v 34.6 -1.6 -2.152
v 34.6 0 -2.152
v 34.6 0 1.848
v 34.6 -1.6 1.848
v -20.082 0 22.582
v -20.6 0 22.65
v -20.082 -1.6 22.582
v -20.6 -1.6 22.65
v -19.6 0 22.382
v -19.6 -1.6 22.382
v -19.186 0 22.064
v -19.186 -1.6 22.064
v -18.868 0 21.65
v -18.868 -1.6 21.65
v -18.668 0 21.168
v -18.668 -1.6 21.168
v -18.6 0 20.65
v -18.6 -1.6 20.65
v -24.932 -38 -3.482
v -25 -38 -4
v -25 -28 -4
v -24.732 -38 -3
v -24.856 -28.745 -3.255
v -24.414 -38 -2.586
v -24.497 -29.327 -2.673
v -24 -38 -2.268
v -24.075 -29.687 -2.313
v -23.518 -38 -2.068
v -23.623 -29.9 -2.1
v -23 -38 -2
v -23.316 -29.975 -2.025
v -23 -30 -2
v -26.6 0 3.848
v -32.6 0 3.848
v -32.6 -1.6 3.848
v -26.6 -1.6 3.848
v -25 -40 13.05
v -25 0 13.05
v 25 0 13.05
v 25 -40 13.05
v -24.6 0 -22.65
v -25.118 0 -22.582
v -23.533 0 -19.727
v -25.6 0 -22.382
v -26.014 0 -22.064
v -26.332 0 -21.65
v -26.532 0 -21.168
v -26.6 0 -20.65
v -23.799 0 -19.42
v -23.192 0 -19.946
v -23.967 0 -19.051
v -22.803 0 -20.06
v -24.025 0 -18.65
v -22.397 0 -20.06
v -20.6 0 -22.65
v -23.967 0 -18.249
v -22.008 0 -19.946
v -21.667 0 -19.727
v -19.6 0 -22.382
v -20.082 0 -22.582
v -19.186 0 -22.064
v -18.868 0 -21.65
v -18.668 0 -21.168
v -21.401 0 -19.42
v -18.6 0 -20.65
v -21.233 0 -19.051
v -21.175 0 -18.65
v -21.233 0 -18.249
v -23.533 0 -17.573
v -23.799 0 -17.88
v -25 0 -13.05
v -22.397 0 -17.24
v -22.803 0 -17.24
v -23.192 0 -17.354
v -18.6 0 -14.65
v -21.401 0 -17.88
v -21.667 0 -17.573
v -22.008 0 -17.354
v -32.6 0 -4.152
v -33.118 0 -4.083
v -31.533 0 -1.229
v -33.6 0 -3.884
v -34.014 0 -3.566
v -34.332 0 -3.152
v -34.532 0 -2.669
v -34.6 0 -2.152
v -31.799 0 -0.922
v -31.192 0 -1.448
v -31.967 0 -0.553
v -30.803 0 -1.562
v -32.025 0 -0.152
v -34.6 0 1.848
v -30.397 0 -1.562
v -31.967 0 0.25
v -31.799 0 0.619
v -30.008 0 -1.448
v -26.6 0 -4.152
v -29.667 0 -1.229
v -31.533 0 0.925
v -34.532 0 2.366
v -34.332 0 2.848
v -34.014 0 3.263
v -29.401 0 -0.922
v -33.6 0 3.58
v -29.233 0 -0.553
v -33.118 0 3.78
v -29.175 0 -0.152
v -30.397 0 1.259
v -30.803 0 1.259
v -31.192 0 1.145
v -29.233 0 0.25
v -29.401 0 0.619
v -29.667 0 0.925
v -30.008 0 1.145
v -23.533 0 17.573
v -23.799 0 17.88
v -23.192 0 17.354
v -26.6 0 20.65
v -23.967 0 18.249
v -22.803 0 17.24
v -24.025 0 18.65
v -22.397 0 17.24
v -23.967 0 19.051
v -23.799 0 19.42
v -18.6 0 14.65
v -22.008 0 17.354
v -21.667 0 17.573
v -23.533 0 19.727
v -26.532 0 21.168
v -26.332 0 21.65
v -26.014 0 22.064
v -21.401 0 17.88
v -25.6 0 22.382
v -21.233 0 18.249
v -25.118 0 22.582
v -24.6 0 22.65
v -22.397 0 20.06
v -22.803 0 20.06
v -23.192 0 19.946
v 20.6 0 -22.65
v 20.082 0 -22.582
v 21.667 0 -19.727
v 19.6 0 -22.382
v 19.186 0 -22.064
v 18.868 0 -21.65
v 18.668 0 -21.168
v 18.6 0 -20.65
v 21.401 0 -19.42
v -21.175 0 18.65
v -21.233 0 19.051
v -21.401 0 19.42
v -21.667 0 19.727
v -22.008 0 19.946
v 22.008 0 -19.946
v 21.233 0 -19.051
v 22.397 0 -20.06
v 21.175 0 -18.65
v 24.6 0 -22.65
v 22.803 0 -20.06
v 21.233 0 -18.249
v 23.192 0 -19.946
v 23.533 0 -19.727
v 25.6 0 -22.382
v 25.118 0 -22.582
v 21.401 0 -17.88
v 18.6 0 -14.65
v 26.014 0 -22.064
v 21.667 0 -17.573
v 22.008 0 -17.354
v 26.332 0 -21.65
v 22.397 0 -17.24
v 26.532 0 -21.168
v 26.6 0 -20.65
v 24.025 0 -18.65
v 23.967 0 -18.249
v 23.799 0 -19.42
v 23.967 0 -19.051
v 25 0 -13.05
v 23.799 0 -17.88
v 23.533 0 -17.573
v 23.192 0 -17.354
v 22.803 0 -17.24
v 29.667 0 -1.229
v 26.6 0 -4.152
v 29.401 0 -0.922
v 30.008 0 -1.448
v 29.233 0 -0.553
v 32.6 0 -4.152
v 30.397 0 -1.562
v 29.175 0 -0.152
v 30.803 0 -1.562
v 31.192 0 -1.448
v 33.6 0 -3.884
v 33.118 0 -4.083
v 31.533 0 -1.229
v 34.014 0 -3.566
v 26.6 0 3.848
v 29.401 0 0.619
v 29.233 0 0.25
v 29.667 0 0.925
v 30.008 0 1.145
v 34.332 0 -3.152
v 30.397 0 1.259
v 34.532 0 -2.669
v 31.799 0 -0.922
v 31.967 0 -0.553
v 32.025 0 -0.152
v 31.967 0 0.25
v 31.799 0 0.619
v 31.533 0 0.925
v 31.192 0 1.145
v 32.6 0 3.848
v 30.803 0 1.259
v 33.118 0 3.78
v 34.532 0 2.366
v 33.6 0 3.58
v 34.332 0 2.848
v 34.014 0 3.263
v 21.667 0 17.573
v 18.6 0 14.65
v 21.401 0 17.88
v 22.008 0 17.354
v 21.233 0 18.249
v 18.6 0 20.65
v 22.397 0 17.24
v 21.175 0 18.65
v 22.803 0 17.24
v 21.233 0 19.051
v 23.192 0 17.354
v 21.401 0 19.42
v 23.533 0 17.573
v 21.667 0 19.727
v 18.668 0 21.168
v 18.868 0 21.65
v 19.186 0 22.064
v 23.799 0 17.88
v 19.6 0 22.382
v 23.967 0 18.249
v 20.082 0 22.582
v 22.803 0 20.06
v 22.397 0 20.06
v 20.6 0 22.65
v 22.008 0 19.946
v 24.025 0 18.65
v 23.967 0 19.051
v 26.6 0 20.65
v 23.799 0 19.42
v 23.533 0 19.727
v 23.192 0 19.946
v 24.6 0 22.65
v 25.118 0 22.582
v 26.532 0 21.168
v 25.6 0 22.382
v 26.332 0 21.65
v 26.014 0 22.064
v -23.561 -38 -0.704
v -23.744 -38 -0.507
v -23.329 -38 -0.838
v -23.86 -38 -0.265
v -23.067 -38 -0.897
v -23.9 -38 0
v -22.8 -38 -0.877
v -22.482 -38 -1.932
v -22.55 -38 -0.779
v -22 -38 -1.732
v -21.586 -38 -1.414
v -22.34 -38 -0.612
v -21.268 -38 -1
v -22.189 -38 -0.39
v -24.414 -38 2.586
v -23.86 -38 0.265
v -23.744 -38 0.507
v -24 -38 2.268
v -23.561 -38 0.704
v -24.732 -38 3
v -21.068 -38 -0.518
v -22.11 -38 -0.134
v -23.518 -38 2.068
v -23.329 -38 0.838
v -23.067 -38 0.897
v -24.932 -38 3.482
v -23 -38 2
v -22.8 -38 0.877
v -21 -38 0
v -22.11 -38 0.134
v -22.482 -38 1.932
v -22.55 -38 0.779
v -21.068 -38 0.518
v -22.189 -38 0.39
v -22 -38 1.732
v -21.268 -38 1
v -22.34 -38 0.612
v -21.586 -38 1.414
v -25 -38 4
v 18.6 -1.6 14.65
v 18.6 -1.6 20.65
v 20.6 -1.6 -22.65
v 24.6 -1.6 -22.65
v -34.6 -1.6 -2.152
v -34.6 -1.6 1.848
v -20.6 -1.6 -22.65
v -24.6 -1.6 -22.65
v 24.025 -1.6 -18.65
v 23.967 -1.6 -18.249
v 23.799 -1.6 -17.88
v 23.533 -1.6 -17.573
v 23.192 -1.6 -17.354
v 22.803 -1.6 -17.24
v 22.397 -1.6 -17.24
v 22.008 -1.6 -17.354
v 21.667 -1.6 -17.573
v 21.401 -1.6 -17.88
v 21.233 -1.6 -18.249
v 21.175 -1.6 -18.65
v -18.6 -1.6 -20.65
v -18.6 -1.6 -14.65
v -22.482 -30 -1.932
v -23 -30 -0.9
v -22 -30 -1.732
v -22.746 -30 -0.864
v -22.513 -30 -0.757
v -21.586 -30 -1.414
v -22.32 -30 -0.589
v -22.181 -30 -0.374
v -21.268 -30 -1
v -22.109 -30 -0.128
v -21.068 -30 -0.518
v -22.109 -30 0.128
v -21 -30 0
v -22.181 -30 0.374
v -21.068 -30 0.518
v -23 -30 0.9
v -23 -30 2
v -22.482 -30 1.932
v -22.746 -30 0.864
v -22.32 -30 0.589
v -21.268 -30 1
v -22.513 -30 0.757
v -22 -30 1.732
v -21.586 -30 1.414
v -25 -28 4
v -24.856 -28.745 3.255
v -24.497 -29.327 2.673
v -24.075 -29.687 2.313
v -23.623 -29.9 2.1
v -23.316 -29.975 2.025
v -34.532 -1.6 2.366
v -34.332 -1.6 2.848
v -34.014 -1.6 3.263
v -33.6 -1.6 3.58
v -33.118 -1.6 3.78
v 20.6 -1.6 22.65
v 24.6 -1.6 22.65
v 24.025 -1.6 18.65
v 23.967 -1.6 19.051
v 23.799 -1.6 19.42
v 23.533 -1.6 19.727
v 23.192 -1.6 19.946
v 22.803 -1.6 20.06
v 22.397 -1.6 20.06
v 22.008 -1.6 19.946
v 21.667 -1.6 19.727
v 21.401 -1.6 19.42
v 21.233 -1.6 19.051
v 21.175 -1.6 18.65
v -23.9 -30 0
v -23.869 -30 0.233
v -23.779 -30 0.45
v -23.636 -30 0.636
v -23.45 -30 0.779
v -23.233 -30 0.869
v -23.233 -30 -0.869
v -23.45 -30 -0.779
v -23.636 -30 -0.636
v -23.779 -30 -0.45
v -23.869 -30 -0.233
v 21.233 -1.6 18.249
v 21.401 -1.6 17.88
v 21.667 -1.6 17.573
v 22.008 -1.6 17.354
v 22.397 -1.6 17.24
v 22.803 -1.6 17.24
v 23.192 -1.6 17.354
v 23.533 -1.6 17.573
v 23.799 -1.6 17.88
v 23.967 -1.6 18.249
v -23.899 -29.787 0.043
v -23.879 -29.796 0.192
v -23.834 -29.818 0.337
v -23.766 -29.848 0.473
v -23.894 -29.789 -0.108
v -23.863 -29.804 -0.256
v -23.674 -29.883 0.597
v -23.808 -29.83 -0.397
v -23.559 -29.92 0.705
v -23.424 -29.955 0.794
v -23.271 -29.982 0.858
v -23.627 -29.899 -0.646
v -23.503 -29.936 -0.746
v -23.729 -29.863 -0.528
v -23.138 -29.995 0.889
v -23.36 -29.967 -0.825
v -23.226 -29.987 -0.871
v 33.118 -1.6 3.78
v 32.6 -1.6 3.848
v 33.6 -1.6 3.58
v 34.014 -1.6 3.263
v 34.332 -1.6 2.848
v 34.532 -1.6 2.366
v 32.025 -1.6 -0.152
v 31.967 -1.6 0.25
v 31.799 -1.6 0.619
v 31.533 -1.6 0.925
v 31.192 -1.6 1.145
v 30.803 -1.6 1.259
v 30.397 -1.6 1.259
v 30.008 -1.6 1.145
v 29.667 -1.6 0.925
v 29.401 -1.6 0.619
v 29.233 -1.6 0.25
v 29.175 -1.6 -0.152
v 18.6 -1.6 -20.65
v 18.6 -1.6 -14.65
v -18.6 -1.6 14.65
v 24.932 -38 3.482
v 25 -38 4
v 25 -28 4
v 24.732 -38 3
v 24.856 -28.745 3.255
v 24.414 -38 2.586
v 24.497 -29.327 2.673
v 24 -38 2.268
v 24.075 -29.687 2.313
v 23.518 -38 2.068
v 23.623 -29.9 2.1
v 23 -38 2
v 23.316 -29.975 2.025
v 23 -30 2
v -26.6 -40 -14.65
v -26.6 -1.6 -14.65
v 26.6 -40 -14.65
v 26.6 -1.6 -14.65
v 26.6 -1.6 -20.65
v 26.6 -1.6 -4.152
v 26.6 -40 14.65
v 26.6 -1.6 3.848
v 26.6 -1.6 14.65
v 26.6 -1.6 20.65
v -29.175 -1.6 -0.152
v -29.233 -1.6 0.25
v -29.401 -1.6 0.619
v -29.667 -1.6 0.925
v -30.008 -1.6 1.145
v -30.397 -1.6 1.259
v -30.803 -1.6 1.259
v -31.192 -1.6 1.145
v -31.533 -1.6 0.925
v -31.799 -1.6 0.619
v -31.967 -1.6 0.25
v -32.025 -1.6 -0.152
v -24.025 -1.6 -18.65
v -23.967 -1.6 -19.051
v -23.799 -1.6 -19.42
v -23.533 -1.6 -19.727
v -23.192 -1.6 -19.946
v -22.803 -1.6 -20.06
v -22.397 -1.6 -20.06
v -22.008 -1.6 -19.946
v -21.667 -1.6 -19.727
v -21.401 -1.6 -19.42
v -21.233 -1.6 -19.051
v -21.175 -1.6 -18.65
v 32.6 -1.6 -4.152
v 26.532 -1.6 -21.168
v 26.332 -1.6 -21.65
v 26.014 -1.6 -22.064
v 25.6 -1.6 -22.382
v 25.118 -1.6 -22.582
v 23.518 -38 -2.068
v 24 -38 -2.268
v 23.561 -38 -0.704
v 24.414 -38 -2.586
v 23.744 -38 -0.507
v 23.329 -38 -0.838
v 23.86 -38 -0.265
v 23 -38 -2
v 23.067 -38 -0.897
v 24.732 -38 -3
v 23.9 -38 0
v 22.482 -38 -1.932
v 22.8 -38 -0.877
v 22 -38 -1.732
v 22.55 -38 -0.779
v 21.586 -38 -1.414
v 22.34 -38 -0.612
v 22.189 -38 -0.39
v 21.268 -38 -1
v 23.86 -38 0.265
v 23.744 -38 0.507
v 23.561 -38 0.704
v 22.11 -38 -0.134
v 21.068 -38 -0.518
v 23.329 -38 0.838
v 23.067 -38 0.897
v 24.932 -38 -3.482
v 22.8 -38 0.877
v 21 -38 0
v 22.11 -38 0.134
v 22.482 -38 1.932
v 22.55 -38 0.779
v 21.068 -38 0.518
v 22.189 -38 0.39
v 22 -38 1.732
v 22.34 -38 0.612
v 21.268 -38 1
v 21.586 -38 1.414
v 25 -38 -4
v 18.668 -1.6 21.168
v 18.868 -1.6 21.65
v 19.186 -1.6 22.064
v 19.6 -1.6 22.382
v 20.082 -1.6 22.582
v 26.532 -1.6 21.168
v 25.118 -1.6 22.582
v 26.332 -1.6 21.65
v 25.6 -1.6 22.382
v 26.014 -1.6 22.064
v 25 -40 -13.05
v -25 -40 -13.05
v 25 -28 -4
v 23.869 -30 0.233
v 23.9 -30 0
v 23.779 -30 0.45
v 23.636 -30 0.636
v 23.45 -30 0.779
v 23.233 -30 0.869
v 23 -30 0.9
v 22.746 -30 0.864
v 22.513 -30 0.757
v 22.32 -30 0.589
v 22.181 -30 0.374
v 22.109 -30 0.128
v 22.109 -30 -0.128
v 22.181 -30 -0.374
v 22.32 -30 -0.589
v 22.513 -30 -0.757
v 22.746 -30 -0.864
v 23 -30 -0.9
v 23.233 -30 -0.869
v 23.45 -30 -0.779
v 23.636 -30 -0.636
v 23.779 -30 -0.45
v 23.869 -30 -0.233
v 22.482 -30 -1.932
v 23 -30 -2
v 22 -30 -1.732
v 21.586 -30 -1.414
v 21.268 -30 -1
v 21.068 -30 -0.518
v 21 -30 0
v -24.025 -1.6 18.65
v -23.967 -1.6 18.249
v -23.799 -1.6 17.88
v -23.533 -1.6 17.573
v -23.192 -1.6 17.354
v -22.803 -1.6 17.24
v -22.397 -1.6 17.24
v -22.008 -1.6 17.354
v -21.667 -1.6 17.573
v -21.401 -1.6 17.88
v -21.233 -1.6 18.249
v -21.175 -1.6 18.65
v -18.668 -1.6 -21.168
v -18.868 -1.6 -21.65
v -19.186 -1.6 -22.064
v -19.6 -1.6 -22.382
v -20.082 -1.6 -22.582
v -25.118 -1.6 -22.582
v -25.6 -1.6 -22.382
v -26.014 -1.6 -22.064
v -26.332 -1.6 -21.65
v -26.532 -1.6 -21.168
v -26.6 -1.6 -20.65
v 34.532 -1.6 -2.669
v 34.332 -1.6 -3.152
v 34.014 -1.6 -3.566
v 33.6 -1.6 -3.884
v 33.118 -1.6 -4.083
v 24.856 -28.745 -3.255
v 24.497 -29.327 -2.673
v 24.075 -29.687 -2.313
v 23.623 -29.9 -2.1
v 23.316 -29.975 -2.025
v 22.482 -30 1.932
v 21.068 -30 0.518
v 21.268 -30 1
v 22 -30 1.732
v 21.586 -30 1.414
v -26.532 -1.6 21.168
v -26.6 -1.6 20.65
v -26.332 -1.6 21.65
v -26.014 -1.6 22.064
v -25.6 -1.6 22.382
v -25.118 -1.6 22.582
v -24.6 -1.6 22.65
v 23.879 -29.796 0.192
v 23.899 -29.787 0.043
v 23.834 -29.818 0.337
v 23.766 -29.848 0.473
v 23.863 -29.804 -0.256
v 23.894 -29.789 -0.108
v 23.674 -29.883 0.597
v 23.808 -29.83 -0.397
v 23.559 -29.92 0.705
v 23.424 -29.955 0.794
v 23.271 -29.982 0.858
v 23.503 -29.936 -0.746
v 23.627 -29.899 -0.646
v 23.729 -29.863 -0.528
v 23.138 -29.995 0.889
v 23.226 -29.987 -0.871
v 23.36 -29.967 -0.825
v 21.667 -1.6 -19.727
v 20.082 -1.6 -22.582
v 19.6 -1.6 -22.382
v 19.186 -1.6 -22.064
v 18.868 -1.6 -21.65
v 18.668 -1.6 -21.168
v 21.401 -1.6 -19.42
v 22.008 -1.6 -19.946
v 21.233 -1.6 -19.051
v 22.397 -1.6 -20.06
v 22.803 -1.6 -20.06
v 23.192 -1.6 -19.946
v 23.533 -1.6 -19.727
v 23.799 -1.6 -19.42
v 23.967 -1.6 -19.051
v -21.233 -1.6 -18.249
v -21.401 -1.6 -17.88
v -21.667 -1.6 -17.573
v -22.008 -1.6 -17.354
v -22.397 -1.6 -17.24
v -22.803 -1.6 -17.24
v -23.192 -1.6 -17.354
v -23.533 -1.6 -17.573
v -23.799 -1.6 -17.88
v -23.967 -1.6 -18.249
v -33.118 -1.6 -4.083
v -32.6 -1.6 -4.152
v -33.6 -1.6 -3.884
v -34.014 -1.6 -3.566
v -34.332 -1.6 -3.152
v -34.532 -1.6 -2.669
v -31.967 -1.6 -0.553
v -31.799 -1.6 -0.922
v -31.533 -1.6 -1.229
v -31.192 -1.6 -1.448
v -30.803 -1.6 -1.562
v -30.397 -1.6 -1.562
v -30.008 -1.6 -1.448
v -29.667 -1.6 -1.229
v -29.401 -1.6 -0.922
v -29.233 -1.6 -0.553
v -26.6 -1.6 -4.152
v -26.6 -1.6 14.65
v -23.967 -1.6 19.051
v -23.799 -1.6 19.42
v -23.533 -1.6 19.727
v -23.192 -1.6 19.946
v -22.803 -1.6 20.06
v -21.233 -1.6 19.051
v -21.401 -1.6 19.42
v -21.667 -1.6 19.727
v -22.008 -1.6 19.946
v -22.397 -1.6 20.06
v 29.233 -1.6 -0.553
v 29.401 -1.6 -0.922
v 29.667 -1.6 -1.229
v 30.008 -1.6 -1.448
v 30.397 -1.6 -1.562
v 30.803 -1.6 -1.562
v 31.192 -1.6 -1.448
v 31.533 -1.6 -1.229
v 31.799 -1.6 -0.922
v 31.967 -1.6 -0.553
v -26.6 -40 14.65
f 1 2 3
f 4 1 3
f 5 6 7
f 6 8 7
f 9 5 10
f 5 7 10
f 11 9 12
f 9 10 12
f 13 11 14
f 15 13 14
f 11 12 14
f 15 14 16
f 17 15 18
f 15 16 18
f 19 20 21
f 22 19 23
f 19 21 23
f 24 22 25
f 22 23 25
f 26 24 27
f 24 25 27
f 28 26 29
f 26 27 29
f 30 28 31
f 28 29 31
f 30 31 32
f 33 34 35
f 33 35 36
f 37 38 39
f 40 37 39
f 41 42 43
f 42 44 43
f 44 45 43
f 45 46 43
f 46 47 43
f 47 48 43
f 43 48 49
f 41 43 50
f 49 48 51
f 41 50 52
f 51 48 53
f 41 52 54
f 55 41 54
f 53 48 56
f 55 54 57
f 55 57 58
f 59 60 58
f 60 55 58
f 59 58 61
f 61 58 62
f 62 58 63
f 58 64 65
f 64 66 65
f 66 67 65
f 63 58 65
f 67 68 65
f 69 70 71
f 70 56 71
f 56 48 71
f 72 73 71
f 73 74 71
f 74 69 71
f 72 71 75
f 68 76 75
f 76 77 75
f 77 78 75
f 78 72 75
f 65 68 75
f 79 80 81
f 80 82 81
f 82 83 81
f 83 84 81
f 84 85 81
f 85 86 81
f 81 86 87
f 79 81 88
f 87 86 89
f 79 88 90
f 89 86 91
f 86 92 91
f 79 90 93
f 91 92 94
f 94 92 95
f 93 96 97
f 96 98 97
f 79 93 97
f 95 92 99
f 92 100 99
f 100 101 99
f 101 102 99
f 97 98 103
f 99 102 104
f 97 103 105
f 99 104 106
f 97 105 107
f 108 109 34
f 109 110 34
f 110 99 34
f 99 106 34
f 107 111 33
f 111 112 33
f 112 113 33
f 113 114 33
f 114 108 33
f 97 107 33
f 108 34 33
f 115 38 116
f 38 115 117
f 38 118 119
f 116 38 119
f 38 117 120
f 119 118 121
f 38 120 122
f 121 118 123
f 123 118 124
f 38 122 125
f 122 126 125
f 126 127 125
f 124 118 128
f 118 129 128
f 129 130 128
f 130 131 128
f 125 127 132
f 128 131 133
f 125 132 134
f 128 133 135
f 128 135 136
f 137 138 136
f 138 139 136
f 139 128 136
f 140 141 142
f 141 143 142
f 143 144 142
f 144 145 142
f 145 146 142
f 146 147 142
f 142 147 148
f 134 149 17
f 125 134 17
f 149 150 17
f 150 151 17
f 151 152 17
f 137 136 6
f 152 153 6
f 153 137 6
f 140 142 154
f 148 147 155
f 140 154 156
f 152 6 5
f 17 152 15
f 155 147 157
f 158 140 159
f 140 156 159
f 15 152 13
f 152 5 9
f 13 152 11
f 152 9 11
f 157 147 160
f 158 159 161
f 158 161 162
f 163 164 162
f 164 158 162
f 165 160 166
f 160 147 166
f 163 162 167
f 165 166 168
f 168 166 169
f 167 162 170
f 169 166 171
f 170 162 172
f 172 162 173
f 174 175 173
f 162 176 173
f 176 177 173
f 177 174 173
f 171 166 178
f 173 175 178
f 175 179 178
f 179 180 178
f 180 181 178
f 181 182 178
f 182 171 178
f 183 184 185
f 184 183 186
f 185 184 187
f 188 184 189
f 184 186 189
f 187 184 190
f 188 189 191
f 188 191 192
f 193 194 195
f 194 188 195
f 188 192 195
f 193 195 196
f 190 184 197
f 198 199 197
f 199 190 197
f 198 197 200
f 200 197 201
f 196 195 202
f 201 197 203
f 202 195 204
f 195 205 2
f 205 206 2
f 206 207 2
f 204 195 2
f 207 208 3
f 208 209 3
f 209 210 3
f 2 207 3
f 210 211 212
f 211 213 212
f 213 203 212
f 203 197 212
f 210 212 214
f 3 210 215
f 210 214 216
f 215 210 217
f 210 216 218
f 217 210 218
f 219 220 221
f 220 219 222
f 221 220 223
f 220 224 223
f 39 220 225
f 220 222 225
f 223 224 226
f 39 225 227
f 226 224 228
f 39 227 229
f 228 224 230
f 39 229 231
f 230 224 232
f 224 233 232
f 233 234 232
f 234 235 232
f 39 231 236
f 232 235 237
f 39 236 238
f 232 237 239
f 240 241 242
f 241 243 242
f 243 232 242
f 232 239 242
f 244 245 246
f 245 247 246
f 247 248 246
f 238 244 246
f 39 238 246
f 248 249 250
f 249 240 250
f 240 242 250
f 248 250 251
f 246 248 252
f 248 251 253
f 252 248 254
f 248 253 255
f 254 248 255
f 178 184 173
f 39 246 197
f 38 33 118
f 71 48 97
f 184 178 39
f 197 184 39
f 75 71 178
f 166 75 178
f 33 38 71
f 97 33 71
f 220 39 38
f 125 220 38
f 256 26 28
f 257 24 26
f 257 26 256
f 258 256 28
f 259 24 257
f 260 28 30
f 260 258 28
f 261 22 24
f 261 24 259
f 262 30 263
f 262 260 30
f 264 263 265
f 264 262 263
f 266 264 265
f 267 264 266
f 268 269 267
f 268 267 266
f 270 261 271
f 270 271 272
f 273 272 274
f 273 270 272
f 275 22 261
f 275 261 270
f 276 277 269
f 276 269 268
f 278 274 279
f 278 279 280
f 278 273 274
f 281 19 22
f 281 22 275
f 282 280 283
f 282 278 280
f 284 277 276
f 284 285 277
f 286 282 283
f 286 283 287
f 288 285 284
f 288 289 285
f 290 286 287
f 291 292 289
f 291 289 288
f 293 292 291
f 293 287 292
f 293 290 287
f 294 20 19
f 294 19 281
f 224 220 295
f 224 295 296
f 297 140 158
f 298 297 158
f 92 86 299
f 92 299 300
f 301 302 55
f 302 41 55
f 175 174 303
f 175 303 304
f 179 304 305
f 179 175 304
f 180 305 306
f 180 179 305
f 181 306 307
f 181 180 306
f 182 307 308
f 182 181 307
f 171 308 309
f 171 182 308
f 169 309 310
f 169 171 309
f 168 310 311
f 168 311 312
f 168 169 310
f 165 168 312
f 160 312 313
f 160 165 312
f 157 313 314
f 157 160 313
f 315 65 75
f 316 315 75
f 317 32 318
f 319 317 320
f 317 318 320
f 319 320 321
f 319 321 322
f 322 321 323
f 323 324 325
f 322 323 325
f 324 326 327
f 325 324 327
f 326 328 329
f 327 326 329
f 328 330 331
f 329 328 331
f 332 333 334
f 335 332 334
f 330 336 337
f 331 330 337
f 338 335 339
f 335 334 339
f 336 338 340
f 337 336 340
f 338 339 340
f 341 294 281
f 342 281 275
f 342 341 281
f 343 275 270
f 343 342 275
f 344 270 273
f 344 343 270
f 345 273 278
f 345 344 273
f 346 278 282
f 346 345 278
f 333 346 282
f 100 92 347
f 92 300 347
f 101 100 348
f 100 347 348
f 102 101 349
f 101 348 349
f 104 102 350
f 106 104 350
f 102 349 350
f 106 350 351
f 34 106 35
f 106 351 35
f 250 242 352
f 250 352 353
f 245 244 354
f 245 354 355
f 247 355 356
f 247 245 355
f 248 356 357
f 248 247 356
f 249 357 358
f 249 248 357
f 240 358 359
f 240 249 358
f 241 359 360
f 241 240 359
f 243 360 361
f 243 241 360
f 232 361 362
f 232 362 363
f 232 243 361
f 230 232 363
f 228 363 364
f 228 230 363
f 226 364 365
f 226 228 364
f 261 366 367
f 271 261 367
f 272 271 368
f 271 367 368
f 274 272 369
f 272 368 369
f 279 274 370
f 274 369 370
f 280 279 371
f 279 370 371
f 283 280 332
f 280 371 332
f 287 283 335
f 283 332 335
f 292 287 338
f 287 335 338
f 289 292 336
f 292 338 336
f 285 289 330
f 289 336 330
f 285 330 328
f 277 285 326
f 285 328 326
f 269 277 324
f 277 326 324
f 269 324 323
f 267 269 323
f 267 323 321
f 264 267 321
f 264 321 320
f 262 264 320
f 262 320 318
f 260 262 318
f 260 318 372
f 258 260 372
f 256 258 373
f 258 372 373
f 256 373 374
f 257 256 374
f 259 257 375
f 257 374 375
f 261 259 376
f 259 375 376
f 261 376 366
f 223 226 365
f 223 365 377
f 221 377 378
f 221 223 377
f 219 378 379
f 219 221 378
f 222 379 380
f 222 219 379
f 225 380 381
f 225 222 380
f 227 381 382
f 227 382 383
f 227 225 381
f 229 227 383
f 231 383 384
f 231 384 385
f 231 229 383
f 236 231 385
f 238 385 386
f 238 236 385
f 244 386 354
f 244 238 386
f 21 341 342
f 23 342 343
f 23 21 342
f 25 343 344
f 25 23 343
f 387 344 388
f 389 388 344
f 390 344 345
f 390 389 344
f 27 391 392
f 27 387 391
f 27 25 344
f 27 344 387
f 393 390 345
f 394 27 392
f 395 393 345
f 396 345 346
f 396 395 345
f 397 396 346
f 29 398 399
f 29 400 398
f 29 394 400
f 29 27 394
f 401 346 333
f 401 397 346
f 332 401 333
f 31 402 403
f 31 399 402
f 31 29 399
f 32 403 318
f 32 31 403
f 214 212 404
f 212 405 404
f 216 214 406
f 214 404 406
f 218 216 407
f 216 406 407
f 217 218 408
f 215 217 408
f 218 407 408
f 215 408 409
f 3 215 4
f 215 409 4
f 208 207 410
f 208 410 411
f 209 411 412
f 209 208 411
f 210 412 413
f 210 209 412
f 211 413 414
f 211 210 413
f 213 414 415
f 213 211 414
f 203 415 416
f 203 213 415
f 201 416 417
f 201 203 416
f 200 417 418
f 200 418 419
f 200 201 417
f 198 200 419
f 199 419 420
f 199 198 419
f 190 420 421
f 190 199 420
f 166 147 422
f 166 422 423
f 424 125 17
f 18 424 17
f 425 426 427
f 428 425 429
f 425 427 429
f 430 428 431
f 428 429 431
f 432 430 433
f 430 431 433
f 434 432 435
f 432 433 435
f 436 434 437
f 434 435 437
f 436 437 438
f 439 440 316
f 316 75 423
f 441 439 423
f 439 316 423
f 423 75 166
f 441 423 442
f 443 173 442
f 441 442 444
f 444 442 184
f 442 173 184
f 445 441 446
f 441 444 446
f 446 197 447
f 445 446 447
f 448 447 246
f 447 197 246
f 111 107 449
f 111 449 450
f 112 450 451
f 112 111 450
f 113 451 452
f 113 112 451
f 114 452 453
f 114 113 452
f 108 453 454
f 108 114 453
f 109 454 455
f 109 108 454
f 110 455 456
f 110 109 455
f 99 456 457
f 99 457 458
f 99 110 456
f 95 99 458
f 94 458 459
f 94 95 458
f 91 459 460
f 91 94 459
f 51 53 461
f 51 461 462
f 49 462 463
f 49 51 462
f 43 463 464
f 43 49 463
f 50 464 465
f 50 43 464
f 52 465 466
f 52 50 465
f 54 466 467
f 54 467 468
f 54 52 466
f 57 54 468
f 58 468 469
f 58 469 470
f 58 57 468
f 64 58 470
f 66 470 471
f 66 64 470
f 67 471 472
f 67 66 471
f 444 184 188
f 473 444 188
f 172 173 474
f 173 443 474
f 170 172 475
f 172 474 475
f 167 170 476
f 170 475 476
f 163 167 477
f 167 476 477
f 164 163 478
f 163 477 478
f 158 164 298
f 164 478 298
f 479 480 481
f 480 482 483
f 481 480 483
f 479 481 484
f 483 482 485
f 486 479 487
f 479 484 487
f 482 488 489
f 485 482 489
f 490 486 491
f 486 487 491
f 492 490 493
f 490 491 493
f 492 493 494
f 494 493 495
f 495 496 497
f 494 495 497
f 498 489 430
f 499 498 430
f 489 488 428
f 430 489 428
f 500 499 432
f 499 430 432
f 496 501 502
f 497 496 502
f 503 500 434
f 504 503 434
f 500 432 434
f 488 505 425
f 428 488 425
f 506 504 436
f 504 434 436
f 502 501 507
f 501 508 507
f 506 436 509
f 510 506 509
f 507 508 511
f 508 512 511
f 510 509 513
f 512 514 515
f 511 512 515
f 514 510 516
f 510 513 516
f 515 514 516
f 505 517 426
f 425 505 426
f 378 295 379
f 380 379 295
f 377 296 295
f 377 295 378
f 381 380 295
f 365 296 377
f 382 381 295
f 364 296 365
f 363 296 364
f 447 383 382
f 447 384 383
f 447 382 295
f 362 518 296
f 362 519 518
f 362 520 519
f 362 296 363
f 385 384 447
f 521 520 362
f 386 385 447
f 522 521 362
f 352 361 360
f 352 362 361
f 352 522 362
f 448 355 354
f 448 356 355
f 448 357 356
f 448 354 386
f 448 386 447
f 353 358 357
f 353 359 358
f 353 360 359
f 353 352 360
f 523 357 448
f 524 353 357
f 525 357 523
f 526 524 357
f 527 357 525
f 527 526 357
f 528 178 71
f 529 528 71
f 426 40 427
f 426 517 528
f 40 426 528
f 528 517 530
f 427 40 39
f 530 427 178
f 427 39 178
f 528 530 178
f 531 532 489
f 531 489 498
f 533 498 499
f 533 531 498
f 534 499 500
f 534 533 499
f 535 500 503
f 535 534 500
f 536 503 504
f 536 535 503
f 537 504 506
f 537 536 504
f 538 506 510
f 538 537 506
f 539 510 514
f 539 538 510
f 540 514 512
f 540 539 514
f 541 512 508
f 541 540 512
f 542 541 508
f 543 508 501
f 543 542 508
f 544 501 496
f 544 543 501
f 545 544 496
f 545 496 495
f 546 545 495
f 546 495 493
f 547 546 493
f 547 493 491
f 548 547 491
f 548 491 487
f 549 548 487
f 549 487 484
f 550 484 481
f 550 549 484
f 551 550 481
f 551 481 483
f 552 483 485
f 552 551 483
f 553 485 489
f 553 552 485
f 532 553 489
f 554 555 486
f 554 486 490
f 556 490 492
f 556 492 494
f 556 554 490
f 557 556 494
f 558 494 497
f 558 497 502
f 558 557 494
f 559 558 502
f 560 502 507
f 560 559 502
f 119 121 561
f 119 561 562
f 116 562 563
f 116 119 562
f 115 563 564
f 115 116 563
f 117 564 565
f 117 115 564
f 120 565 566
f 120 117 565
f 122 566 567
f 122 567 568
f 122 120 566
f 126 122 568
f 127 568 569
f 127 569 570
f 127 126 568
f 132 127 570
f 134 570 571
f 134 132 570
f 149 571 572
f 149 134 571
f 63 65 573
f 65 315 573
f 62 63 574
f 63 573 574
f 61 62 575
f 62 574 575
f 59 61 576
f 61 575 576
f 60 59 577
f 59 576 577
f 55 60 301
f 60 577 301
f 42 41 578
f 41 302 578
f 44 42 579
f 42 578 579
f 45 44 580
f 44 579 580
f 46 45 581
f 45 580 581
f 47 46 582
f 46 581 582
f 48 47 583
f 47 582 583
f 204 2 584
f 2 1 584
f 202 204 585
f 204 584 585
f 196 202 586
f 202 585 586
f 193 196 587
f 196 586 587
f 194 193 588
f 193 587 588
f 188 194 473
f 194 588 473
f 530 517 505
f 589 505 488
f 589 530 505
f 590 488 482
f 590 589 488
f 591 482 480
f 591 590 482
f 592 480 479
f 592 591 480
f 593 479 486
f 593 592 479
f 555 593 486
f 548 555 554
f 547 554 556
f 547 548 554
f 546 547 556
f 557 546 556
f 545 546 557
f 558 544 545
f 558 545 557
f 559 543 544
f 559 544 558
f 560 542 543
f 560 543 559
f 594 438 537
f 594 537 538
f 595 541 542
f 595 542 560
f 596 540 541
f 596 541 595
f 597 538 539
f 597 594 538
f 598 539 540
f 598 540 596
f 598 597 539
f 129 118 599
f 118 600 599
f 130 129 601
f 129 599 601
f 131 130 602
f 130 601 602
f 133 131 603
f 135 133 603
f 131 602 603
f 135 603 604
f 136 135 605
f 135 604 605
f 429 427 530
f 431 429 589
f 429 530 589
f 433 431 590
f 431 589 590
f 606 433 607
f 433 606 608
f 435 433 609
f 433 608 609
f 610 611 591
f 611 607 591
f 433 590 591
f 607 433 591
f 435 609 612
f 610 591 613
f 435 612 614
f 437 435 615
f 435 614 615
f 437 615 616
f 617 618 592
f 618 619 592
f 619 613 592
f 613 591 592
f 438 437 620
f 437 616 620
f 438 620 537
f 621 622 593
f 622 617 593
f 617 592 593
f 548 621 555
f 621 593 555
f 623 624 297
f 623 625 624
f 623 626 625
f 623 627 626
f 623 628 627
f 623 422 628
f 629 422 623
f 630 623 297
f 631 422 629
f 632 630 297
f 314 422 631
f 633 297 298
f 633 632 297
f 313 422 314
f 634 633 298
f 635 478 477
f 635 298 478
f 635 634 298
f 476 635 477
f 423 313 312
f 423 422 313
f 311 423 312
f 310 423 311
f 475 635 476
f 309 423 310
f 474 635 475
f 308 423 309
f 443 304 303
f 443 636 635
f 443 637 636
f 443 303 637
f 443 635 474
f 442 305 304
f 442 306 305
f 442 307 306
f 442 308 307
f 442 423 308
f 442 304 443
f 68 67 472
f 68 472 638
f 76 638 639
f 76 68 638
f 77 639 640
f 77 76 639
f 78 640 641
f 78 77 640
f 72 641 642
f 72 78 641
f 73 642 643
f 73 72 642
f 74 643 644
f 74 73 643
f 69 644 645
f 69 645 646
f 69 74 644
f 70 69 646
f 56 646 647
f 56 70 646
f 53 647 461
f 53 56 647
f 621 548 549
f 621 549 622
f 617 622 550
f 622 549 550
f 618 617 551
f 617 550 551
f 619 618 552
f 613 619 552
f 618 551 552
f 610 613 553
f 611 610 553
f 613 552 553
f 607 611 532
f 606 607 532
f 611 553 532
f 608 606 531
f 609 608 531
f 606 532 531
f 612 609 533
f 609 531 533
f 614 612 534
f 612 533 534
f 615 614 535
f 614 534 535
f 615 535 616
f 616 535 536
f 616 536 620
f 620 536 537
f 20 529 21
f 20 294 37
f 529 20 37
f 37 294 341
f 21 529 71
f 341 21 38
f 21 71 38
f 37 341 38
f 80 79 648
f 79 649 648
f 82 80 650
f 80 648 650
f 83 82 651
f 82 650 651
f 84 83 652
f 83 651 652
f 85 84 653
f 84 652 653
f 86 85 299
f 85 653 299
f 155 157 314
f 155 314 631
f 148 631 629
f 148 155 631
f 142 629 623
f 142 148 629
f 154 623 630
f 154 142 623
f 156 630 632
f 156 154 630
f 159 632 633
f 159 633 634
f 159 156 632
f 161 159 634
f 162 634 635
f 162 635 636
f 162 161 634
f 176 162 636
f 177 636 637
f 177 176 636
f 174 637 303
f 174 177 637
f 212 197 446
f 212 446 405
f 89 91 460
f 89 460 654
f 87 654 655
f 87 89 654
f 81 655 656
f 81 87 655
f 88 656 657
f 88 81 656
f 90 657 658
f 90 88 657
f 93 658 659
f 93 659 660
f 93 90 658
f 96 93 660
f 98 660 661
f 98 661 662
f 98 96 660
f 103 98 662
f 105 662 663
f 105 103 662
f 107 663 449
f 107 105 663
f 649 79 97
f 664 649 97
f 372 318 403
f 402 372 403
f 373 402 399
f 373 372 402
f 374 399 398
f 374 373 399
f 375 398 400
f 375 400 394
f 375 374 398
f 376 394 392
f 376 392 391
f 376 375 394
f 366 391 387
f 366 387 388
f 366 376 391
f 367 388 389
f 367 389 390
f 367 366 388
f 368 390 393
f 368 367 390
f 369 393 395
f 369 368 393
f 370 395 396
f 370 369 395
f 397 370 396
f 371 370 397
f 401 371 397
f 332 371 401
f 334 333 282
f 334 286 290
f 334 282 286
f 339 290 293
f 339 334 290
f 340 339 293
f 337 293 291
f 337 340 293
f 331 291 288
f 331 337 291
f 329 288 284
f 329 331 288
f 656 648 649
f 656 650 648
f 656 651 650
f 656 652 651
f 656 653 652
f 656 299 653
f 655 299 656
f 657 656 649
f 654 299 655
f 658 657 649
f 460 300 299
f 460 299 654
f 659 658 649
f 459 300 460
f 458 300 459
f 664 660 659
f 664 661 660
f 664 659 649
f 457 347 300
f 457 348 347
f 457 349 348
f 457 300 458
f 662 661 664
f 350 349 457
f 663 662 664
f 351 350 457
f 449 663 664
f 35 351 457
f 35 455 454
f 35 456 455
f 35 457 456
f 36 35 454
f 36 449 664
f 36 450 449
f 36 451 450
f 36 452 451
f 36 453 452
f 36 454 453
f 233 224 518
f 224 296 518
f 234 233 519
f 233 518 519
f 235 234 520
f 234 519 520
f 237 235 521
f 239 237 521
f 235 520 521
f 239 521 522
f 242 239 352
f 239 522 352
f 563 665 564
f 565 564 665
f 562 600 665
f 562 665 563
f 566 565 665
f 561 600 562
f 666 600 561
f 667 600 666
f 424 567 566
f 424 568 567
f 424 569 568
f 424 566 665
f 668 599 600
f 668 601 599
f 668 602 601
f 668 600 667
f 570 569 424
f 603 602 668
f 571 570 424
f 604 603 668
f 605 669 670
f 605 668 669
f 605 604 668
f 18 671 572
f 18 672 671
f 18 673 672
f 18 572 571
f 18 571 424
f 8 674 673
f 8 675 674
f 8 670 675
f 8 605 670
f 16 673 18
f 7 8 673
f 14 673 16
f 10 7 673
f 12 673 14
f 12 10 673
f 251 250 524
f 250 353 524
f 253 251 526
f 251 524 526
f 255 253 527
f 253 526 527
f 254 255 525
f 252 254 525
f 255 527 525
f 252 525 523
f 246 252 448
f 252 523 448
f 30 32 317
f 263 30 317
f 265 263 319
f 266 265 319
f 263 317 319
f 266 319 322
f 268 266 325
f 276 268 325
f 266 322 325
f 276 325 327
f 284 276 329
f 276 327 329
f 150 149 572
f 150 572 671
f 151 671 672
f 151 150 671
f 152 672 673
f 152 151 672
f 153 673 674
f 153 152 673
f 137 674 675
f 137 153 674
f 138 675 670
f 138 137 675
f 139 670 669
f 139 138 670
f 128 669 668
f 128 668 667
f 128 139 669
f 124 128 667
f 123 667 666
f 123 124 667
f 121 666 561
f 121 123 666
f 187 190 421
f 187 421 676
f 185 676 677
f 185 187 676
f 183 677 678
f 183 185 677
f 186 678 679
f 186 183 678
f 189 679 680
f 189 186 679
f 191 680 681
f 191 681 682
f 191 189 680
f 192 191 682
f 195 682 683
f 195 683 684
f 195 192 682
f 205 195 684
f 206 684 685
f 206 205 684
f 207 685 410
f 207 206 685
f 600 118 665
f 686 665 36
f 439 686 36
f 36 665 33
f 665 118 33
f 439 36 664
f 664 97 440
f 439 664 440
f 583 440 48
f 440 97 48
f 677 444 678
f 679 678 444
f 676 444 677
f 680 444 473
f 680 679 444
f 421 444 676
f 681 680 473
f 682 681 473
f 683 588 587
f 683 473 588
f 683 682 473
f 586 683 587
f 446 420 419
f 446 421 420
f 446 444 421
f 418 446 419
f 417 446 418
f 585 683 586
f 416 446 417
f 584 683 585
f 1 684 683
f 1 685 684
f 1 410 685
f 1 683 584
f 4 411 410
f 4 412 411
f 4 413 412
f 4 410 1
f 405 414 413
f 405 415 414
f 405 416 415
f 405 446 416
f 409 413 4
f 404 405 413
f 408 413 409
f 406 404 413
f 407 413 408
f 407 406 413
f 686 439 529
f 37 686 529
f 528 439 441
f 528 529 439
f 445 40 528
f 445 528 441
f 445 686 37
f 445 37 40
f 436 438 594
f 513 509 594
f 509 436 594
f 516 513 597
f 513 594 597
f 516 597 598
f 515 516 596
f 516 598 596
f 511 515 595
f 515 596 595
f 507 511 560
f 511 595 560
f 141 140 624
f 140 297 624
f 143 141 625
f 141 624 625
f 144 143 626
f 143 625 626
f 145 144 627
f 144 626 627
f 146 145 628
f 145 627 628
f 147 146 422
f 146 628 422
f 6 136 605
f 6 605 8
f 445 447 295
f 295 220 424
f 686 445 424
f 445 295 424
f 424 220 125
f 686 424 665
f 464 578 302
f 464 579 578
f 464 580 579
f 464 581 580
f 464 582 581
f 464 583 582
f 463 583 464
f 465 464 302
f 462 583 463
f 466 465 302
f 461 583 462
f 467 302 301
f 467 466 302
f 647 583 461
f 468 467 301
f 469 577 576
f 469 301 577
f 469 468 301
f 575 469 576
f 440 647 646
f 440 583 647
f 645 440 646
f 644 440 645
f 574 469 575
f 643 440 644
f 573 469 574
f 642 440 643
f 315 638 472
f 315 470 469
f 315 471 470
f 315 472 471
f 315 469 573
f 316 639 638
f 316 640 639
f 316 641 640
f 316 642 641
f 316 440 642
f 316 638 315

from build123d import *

# Parameters (mm, degrees)
F1_DEPTH     = 40
F0_W         = 8
F0_H         = 8
F0_R         = 1.425
F2_DEPTH     = 1.6
F3_R         = 2
F5_R         = 2
F6_START     = 30
F0_W_2       = 4
F0_H_2       = 4
F0_R_2       = 0.9
F6_DEPTH     = 8
F7_T1_DEPTH  = 8
F7_T6_DEPTH  = 4
F7_S7_R      = 0.9
F7_T8_DEPTH  = 4
F7_T13_DEPTH = 9
F7_T17_DEPTH = 13
F7_T24_DEPTH = 9
F7_T28_DEPTH = 13
F7_T31_DEPTH = 18


# Not quite as in the source:
# - a fillet or chamfer that OpenCascade refuses, or shapes differently, is made with other operations: its cross-section is extruded or revolved along the edge and cut away or added


with BuildPart() as f1:
    # F0 (on Front) → F1 (new body)
    with BuildSketch(Plane.XZ):
        Polygon((-26.6, -4.1515841149), (-26.6, -14.65), (-18.6, -14.65), (18.6, -14.65), (26.6, -14.65), (26.6, -4.1515841149), (26.6, 3.8484158851), (26.6, 14.65), (18.6, 14.65), (-18.6, 14.65), (-26.6, 14.65), (-26.6, 3.8484158851), align=None)
        Polygon((25, -2), (25, -13.05), (-25, -13.05), (-25, 13.05), (25, 13.05), (25, 2), align=None, mode=Mode.SUBTRACT)
    extrude(amount=F1_DEPTH)

    # F0 (on Front) → F2 (join)
    with BuildSketch(Plane.XZ):
        Polygon((-26.6, -4.1515841149), (-26.6, -14.65), (-18.6, -14.65), (18.6, -14.65), (26.6, -14.65), (26.6, -4.1515841149), (26.6, 3.8484158851), (26.6, 14.65), (18.6, 14.65), (-18.6, 14.65), (-26.6, 14.65), (-26.6, 3.8484158851), align=None)
        Polygon((25, -2), (25, -13.05), (-25, -13.05), (-25, 13.05), (25, 13.05), (25, 2), align=None, mode=Mode.SUBTRACT)
        with Locations((-22.6, -18.65)):
            Rectangle(F0_W, F0_H)
        with Locations((-22.6, -18.65)):
            Circle(F0_R, mode=Mode.SUBTRACT)
        with Locations((-30.6, -0.1515841149)):
            Rectangle(F0_W, F0_H)
        with Locations((-30.6, -0.1515841149)):
            Circle(F0_R, mode=Mode.SUBTRACT)
        with Locations((22.6, -18.65)):
            Rectangle(F0_W, F0_H)
        with Locations((22.6, -18.65)):
            Circle(F0_R, mode=Mode.SUBTRACT)
        with Locations((-22.6, 18.65)):
            Rectangle(F0_W, F0_H)
        with Locations((-22.6, 18.65)):
            Circle(F0_R, mode=Mode.SUBTRACT)
        with Locations((30.6, -0.1515841149)):
            Rectangle(F0_W, F0_H)
        with Locations((30.6, -0.1515841149)):
            Circle(F0_R, mode=Mode.SUBTRACT)
        with Locations((22.6, 18.65)):
            Rectangle(F0_W, F0_H)
        with Locations((22.6, 18.65)):
            Circle(F0_R, mode=Mode.SUBTRACT)
    extrude(amount=F2_DEPTH)

    # F3
    f3_edges = [f1.edges().sort_by_distance(p)[0] for p in [
        (-26.6, -0.8, 22.65),
        (-18.6, -0.8, 22.65),
        (18.6, -0.8, 22.65),
        (26.6, -0.8, 22.65),
        (34.6, -0.8, 3.848416),
        (34.6, -0.8, -4.151584),
        (26.6, -0.8, -22.65),
        (18.6, -0.8, -22.65),
        (-34.6, -0.8, -4.151584),
        (-34.6, -0.8, 3.848416),
        (-26.6, -0.8, -22.65),
    ]]
    fillet(f3_edges, radius=F3_R)

    # F4: F1 across plane


with BuildPart() as f1_1:
    add(f1.part)
    add(f1.part.mirror(Plane.YZ))

    # F5
    f5_edges = [f1_1.edges().sort_by_distance(p)[0] for p in [
        (-18.6, -0.8, -22.65),
        (18.6, -0.8, -22.65),
    ]]
    fillet(f5_edges, radius=F5_R)

    # F0 (on Front) → F6 (join)
    with BuildSketch(Plane.XZ.offset(F6_START)):
        with Locations((23, 0)):
            Rectangle(F0_W_2, F0_H_2)
        with Locations((23, 0)):
            Circle(F0_R_2, mode=Mode.SUBTRACT)
    extrude(amount=F6_DEPTH)

    # F7: fillet of radius 2 on 5 edges, made by hand

    # F7_s2 → F7_t1 (join)
    with BuildSketch(Plane.XZ.offset(30)):
        with BuildLine():
            ThreePointArc((25, -4), (24.4142135624, -2.5857864376), (23, -2))
            Line((23, -2), (25, -2))
            Line((25, -2), (25, -4))
        make_face()
        with BuildLine():
            ThreePointArc((25, 4), (24.4142135624, 2.5857864376), (23, 2))
            Line((23, 2), (25, 2))
            Line((25, 2), (25, 4))
        make_face()
    extrude(amount=F7_T1_DEPTH)


with BuildPart() as f7_tool4:
    # F7_s5 → F7_t6 (new body)
    with BuildSketch(Plane.XY.offset(-2)):
        with BuildLine():
            ThreePointArc((25, -28), (24.4142135624, -29.4142135624), (23, -30))
            Line((23, -30), (25, -30))
            Line((25, -30), (25, -28))
        make_face()
    extrude(amount=F7_T6_DEPTH)

    # F7_s7 → F7_t8 (cut, symmetric)
    with BuildSketch(Plane.XZ.offset(29)):
        with Locations((23, 0)):
            Circle(F7_S7_R)
    extrude(amount=F7_T8_DEPTH, both=True, mode=Mode.SUBTRACT)


with BuildPart() as f1_2:
    add(f1_1.part)

    # F7_t3: union F7_tool4
    add(f7_tool4.part)


with BuildPart() as f7_tool11:
    # F7_s12 → F7_t13 (new body)
    with BuildSketch(Plane.XY.offset(-7)):
        with BuildLine():
            ThreePointArc((25, -28), (24.4142135624, -29.4142135624), (23, -30))
            Line((23, -30), (25, -30))
            Line((25, -30), (25, -28))
        make_face()
    extrude(amount=F7_T13_DEPTH)

    split(bisect_by=Plane.XY.offset(-2), keep=Keep.BOTTOM)


with BuildPart() as f7_tool15:
    # F7_s16 → F7_t17 (new body)
    with BuildSketch(Plane.XZ.offset(25)):
        with BuildLine():
            ThreePointArc((25, -4), (24.4142135624, -2.5857864376), (23, -2))
            Line((23, -2), (25, -2))
            Line((25, -2), (25, -4))
        make_face()
    extrude(amount=F7_T17_DEPTH)

    split(bisect_by=Plane.XZ.offset(30), keep=Keep.BOTTOM)


with BuildPart() as f7_tool11_1:
    add(f7_tool11.part)

    # F7_t19: intersect F7_tool15
    add(f7_tool15.part, mode=Mode.INTERSECT)


with BuildPart() as f1_3:
    add(f1_2.part)

    # F7_t9: union F7_tool11
    add(f7_tool11_1.part)


with BuildPart() as f7_tool22:
    # F7_s23 → F7_t24 (new body)
    with BuildSketch(Plane.XY.offset(-2)):
        with BuildLine():
            ThreePointArc((25, -28), (24.4142135624, -29.4142135624), (23, -30))
            Line((23, -30), (25, -30))
            Line((25, -30), (25, -28))
        make_face()
    extrude(amount=F7_T24_DEPTH)

    split(bisect_by=Plane.XY.offset(2), keep=Keep.TOP)


with BuildPart() as f7_tool26:
    # F7_s27 → F7_t28 (new body)
    with BuildSketch(Plane.XZ.offset(25)):
        with BuildLine():
            ThreePointArc((25, 4), (24.4142135624, 2.5857864376), (23, 2))
            Line((23, 2), (25, 2))
            Line((25, 2), (25, 4))
        make_face()
    extrude(amount=F7_T28_DEPTH)

    split(bisect_by=Plane.XZ.offset(30), keep=Keep.BOTTOM)


with BuildPart() as f7_tool22_1:
    add(f7_tool22.part)

    # F7_t30: intersect F7_tool26
    add(f7_tool26.part, mode=Mode.INTERSECT)


with BuildPart() as f1_4:
    add(f1_3.part)

    # F7_t20: union F7_tool22
    add(f7_tool22_1.part)

    # F7_s32 → F7_t31 (cut)
    with BuildSketch(Plane.XZ.offset(25)):
        with BuildLine():
            ThreePointArc((23, -2), (21.5857864376, -1.4142135624), (21, 0))
            Line((21, 0), (21, -2))
            Line((21, -2), (23, -2))
        make_face()
        with BuildLine():
            ThreePointArc((23, 2), (21.5857864376, 1.4142135624), (21, 0))
            Line((21, 0), (21, 2))
            Line((21, 2), (23, 2))
        make_face()
    extrude(amount=F7_T31_DEPTH, mode=Mode.SUBTRACT)

    # F8: F1 across plane


with BuildPart() as f1_5:
    add(f1_4.part)
    add(f1_4.part.mirror(Plane.YZ))


solid = f1_5.part
